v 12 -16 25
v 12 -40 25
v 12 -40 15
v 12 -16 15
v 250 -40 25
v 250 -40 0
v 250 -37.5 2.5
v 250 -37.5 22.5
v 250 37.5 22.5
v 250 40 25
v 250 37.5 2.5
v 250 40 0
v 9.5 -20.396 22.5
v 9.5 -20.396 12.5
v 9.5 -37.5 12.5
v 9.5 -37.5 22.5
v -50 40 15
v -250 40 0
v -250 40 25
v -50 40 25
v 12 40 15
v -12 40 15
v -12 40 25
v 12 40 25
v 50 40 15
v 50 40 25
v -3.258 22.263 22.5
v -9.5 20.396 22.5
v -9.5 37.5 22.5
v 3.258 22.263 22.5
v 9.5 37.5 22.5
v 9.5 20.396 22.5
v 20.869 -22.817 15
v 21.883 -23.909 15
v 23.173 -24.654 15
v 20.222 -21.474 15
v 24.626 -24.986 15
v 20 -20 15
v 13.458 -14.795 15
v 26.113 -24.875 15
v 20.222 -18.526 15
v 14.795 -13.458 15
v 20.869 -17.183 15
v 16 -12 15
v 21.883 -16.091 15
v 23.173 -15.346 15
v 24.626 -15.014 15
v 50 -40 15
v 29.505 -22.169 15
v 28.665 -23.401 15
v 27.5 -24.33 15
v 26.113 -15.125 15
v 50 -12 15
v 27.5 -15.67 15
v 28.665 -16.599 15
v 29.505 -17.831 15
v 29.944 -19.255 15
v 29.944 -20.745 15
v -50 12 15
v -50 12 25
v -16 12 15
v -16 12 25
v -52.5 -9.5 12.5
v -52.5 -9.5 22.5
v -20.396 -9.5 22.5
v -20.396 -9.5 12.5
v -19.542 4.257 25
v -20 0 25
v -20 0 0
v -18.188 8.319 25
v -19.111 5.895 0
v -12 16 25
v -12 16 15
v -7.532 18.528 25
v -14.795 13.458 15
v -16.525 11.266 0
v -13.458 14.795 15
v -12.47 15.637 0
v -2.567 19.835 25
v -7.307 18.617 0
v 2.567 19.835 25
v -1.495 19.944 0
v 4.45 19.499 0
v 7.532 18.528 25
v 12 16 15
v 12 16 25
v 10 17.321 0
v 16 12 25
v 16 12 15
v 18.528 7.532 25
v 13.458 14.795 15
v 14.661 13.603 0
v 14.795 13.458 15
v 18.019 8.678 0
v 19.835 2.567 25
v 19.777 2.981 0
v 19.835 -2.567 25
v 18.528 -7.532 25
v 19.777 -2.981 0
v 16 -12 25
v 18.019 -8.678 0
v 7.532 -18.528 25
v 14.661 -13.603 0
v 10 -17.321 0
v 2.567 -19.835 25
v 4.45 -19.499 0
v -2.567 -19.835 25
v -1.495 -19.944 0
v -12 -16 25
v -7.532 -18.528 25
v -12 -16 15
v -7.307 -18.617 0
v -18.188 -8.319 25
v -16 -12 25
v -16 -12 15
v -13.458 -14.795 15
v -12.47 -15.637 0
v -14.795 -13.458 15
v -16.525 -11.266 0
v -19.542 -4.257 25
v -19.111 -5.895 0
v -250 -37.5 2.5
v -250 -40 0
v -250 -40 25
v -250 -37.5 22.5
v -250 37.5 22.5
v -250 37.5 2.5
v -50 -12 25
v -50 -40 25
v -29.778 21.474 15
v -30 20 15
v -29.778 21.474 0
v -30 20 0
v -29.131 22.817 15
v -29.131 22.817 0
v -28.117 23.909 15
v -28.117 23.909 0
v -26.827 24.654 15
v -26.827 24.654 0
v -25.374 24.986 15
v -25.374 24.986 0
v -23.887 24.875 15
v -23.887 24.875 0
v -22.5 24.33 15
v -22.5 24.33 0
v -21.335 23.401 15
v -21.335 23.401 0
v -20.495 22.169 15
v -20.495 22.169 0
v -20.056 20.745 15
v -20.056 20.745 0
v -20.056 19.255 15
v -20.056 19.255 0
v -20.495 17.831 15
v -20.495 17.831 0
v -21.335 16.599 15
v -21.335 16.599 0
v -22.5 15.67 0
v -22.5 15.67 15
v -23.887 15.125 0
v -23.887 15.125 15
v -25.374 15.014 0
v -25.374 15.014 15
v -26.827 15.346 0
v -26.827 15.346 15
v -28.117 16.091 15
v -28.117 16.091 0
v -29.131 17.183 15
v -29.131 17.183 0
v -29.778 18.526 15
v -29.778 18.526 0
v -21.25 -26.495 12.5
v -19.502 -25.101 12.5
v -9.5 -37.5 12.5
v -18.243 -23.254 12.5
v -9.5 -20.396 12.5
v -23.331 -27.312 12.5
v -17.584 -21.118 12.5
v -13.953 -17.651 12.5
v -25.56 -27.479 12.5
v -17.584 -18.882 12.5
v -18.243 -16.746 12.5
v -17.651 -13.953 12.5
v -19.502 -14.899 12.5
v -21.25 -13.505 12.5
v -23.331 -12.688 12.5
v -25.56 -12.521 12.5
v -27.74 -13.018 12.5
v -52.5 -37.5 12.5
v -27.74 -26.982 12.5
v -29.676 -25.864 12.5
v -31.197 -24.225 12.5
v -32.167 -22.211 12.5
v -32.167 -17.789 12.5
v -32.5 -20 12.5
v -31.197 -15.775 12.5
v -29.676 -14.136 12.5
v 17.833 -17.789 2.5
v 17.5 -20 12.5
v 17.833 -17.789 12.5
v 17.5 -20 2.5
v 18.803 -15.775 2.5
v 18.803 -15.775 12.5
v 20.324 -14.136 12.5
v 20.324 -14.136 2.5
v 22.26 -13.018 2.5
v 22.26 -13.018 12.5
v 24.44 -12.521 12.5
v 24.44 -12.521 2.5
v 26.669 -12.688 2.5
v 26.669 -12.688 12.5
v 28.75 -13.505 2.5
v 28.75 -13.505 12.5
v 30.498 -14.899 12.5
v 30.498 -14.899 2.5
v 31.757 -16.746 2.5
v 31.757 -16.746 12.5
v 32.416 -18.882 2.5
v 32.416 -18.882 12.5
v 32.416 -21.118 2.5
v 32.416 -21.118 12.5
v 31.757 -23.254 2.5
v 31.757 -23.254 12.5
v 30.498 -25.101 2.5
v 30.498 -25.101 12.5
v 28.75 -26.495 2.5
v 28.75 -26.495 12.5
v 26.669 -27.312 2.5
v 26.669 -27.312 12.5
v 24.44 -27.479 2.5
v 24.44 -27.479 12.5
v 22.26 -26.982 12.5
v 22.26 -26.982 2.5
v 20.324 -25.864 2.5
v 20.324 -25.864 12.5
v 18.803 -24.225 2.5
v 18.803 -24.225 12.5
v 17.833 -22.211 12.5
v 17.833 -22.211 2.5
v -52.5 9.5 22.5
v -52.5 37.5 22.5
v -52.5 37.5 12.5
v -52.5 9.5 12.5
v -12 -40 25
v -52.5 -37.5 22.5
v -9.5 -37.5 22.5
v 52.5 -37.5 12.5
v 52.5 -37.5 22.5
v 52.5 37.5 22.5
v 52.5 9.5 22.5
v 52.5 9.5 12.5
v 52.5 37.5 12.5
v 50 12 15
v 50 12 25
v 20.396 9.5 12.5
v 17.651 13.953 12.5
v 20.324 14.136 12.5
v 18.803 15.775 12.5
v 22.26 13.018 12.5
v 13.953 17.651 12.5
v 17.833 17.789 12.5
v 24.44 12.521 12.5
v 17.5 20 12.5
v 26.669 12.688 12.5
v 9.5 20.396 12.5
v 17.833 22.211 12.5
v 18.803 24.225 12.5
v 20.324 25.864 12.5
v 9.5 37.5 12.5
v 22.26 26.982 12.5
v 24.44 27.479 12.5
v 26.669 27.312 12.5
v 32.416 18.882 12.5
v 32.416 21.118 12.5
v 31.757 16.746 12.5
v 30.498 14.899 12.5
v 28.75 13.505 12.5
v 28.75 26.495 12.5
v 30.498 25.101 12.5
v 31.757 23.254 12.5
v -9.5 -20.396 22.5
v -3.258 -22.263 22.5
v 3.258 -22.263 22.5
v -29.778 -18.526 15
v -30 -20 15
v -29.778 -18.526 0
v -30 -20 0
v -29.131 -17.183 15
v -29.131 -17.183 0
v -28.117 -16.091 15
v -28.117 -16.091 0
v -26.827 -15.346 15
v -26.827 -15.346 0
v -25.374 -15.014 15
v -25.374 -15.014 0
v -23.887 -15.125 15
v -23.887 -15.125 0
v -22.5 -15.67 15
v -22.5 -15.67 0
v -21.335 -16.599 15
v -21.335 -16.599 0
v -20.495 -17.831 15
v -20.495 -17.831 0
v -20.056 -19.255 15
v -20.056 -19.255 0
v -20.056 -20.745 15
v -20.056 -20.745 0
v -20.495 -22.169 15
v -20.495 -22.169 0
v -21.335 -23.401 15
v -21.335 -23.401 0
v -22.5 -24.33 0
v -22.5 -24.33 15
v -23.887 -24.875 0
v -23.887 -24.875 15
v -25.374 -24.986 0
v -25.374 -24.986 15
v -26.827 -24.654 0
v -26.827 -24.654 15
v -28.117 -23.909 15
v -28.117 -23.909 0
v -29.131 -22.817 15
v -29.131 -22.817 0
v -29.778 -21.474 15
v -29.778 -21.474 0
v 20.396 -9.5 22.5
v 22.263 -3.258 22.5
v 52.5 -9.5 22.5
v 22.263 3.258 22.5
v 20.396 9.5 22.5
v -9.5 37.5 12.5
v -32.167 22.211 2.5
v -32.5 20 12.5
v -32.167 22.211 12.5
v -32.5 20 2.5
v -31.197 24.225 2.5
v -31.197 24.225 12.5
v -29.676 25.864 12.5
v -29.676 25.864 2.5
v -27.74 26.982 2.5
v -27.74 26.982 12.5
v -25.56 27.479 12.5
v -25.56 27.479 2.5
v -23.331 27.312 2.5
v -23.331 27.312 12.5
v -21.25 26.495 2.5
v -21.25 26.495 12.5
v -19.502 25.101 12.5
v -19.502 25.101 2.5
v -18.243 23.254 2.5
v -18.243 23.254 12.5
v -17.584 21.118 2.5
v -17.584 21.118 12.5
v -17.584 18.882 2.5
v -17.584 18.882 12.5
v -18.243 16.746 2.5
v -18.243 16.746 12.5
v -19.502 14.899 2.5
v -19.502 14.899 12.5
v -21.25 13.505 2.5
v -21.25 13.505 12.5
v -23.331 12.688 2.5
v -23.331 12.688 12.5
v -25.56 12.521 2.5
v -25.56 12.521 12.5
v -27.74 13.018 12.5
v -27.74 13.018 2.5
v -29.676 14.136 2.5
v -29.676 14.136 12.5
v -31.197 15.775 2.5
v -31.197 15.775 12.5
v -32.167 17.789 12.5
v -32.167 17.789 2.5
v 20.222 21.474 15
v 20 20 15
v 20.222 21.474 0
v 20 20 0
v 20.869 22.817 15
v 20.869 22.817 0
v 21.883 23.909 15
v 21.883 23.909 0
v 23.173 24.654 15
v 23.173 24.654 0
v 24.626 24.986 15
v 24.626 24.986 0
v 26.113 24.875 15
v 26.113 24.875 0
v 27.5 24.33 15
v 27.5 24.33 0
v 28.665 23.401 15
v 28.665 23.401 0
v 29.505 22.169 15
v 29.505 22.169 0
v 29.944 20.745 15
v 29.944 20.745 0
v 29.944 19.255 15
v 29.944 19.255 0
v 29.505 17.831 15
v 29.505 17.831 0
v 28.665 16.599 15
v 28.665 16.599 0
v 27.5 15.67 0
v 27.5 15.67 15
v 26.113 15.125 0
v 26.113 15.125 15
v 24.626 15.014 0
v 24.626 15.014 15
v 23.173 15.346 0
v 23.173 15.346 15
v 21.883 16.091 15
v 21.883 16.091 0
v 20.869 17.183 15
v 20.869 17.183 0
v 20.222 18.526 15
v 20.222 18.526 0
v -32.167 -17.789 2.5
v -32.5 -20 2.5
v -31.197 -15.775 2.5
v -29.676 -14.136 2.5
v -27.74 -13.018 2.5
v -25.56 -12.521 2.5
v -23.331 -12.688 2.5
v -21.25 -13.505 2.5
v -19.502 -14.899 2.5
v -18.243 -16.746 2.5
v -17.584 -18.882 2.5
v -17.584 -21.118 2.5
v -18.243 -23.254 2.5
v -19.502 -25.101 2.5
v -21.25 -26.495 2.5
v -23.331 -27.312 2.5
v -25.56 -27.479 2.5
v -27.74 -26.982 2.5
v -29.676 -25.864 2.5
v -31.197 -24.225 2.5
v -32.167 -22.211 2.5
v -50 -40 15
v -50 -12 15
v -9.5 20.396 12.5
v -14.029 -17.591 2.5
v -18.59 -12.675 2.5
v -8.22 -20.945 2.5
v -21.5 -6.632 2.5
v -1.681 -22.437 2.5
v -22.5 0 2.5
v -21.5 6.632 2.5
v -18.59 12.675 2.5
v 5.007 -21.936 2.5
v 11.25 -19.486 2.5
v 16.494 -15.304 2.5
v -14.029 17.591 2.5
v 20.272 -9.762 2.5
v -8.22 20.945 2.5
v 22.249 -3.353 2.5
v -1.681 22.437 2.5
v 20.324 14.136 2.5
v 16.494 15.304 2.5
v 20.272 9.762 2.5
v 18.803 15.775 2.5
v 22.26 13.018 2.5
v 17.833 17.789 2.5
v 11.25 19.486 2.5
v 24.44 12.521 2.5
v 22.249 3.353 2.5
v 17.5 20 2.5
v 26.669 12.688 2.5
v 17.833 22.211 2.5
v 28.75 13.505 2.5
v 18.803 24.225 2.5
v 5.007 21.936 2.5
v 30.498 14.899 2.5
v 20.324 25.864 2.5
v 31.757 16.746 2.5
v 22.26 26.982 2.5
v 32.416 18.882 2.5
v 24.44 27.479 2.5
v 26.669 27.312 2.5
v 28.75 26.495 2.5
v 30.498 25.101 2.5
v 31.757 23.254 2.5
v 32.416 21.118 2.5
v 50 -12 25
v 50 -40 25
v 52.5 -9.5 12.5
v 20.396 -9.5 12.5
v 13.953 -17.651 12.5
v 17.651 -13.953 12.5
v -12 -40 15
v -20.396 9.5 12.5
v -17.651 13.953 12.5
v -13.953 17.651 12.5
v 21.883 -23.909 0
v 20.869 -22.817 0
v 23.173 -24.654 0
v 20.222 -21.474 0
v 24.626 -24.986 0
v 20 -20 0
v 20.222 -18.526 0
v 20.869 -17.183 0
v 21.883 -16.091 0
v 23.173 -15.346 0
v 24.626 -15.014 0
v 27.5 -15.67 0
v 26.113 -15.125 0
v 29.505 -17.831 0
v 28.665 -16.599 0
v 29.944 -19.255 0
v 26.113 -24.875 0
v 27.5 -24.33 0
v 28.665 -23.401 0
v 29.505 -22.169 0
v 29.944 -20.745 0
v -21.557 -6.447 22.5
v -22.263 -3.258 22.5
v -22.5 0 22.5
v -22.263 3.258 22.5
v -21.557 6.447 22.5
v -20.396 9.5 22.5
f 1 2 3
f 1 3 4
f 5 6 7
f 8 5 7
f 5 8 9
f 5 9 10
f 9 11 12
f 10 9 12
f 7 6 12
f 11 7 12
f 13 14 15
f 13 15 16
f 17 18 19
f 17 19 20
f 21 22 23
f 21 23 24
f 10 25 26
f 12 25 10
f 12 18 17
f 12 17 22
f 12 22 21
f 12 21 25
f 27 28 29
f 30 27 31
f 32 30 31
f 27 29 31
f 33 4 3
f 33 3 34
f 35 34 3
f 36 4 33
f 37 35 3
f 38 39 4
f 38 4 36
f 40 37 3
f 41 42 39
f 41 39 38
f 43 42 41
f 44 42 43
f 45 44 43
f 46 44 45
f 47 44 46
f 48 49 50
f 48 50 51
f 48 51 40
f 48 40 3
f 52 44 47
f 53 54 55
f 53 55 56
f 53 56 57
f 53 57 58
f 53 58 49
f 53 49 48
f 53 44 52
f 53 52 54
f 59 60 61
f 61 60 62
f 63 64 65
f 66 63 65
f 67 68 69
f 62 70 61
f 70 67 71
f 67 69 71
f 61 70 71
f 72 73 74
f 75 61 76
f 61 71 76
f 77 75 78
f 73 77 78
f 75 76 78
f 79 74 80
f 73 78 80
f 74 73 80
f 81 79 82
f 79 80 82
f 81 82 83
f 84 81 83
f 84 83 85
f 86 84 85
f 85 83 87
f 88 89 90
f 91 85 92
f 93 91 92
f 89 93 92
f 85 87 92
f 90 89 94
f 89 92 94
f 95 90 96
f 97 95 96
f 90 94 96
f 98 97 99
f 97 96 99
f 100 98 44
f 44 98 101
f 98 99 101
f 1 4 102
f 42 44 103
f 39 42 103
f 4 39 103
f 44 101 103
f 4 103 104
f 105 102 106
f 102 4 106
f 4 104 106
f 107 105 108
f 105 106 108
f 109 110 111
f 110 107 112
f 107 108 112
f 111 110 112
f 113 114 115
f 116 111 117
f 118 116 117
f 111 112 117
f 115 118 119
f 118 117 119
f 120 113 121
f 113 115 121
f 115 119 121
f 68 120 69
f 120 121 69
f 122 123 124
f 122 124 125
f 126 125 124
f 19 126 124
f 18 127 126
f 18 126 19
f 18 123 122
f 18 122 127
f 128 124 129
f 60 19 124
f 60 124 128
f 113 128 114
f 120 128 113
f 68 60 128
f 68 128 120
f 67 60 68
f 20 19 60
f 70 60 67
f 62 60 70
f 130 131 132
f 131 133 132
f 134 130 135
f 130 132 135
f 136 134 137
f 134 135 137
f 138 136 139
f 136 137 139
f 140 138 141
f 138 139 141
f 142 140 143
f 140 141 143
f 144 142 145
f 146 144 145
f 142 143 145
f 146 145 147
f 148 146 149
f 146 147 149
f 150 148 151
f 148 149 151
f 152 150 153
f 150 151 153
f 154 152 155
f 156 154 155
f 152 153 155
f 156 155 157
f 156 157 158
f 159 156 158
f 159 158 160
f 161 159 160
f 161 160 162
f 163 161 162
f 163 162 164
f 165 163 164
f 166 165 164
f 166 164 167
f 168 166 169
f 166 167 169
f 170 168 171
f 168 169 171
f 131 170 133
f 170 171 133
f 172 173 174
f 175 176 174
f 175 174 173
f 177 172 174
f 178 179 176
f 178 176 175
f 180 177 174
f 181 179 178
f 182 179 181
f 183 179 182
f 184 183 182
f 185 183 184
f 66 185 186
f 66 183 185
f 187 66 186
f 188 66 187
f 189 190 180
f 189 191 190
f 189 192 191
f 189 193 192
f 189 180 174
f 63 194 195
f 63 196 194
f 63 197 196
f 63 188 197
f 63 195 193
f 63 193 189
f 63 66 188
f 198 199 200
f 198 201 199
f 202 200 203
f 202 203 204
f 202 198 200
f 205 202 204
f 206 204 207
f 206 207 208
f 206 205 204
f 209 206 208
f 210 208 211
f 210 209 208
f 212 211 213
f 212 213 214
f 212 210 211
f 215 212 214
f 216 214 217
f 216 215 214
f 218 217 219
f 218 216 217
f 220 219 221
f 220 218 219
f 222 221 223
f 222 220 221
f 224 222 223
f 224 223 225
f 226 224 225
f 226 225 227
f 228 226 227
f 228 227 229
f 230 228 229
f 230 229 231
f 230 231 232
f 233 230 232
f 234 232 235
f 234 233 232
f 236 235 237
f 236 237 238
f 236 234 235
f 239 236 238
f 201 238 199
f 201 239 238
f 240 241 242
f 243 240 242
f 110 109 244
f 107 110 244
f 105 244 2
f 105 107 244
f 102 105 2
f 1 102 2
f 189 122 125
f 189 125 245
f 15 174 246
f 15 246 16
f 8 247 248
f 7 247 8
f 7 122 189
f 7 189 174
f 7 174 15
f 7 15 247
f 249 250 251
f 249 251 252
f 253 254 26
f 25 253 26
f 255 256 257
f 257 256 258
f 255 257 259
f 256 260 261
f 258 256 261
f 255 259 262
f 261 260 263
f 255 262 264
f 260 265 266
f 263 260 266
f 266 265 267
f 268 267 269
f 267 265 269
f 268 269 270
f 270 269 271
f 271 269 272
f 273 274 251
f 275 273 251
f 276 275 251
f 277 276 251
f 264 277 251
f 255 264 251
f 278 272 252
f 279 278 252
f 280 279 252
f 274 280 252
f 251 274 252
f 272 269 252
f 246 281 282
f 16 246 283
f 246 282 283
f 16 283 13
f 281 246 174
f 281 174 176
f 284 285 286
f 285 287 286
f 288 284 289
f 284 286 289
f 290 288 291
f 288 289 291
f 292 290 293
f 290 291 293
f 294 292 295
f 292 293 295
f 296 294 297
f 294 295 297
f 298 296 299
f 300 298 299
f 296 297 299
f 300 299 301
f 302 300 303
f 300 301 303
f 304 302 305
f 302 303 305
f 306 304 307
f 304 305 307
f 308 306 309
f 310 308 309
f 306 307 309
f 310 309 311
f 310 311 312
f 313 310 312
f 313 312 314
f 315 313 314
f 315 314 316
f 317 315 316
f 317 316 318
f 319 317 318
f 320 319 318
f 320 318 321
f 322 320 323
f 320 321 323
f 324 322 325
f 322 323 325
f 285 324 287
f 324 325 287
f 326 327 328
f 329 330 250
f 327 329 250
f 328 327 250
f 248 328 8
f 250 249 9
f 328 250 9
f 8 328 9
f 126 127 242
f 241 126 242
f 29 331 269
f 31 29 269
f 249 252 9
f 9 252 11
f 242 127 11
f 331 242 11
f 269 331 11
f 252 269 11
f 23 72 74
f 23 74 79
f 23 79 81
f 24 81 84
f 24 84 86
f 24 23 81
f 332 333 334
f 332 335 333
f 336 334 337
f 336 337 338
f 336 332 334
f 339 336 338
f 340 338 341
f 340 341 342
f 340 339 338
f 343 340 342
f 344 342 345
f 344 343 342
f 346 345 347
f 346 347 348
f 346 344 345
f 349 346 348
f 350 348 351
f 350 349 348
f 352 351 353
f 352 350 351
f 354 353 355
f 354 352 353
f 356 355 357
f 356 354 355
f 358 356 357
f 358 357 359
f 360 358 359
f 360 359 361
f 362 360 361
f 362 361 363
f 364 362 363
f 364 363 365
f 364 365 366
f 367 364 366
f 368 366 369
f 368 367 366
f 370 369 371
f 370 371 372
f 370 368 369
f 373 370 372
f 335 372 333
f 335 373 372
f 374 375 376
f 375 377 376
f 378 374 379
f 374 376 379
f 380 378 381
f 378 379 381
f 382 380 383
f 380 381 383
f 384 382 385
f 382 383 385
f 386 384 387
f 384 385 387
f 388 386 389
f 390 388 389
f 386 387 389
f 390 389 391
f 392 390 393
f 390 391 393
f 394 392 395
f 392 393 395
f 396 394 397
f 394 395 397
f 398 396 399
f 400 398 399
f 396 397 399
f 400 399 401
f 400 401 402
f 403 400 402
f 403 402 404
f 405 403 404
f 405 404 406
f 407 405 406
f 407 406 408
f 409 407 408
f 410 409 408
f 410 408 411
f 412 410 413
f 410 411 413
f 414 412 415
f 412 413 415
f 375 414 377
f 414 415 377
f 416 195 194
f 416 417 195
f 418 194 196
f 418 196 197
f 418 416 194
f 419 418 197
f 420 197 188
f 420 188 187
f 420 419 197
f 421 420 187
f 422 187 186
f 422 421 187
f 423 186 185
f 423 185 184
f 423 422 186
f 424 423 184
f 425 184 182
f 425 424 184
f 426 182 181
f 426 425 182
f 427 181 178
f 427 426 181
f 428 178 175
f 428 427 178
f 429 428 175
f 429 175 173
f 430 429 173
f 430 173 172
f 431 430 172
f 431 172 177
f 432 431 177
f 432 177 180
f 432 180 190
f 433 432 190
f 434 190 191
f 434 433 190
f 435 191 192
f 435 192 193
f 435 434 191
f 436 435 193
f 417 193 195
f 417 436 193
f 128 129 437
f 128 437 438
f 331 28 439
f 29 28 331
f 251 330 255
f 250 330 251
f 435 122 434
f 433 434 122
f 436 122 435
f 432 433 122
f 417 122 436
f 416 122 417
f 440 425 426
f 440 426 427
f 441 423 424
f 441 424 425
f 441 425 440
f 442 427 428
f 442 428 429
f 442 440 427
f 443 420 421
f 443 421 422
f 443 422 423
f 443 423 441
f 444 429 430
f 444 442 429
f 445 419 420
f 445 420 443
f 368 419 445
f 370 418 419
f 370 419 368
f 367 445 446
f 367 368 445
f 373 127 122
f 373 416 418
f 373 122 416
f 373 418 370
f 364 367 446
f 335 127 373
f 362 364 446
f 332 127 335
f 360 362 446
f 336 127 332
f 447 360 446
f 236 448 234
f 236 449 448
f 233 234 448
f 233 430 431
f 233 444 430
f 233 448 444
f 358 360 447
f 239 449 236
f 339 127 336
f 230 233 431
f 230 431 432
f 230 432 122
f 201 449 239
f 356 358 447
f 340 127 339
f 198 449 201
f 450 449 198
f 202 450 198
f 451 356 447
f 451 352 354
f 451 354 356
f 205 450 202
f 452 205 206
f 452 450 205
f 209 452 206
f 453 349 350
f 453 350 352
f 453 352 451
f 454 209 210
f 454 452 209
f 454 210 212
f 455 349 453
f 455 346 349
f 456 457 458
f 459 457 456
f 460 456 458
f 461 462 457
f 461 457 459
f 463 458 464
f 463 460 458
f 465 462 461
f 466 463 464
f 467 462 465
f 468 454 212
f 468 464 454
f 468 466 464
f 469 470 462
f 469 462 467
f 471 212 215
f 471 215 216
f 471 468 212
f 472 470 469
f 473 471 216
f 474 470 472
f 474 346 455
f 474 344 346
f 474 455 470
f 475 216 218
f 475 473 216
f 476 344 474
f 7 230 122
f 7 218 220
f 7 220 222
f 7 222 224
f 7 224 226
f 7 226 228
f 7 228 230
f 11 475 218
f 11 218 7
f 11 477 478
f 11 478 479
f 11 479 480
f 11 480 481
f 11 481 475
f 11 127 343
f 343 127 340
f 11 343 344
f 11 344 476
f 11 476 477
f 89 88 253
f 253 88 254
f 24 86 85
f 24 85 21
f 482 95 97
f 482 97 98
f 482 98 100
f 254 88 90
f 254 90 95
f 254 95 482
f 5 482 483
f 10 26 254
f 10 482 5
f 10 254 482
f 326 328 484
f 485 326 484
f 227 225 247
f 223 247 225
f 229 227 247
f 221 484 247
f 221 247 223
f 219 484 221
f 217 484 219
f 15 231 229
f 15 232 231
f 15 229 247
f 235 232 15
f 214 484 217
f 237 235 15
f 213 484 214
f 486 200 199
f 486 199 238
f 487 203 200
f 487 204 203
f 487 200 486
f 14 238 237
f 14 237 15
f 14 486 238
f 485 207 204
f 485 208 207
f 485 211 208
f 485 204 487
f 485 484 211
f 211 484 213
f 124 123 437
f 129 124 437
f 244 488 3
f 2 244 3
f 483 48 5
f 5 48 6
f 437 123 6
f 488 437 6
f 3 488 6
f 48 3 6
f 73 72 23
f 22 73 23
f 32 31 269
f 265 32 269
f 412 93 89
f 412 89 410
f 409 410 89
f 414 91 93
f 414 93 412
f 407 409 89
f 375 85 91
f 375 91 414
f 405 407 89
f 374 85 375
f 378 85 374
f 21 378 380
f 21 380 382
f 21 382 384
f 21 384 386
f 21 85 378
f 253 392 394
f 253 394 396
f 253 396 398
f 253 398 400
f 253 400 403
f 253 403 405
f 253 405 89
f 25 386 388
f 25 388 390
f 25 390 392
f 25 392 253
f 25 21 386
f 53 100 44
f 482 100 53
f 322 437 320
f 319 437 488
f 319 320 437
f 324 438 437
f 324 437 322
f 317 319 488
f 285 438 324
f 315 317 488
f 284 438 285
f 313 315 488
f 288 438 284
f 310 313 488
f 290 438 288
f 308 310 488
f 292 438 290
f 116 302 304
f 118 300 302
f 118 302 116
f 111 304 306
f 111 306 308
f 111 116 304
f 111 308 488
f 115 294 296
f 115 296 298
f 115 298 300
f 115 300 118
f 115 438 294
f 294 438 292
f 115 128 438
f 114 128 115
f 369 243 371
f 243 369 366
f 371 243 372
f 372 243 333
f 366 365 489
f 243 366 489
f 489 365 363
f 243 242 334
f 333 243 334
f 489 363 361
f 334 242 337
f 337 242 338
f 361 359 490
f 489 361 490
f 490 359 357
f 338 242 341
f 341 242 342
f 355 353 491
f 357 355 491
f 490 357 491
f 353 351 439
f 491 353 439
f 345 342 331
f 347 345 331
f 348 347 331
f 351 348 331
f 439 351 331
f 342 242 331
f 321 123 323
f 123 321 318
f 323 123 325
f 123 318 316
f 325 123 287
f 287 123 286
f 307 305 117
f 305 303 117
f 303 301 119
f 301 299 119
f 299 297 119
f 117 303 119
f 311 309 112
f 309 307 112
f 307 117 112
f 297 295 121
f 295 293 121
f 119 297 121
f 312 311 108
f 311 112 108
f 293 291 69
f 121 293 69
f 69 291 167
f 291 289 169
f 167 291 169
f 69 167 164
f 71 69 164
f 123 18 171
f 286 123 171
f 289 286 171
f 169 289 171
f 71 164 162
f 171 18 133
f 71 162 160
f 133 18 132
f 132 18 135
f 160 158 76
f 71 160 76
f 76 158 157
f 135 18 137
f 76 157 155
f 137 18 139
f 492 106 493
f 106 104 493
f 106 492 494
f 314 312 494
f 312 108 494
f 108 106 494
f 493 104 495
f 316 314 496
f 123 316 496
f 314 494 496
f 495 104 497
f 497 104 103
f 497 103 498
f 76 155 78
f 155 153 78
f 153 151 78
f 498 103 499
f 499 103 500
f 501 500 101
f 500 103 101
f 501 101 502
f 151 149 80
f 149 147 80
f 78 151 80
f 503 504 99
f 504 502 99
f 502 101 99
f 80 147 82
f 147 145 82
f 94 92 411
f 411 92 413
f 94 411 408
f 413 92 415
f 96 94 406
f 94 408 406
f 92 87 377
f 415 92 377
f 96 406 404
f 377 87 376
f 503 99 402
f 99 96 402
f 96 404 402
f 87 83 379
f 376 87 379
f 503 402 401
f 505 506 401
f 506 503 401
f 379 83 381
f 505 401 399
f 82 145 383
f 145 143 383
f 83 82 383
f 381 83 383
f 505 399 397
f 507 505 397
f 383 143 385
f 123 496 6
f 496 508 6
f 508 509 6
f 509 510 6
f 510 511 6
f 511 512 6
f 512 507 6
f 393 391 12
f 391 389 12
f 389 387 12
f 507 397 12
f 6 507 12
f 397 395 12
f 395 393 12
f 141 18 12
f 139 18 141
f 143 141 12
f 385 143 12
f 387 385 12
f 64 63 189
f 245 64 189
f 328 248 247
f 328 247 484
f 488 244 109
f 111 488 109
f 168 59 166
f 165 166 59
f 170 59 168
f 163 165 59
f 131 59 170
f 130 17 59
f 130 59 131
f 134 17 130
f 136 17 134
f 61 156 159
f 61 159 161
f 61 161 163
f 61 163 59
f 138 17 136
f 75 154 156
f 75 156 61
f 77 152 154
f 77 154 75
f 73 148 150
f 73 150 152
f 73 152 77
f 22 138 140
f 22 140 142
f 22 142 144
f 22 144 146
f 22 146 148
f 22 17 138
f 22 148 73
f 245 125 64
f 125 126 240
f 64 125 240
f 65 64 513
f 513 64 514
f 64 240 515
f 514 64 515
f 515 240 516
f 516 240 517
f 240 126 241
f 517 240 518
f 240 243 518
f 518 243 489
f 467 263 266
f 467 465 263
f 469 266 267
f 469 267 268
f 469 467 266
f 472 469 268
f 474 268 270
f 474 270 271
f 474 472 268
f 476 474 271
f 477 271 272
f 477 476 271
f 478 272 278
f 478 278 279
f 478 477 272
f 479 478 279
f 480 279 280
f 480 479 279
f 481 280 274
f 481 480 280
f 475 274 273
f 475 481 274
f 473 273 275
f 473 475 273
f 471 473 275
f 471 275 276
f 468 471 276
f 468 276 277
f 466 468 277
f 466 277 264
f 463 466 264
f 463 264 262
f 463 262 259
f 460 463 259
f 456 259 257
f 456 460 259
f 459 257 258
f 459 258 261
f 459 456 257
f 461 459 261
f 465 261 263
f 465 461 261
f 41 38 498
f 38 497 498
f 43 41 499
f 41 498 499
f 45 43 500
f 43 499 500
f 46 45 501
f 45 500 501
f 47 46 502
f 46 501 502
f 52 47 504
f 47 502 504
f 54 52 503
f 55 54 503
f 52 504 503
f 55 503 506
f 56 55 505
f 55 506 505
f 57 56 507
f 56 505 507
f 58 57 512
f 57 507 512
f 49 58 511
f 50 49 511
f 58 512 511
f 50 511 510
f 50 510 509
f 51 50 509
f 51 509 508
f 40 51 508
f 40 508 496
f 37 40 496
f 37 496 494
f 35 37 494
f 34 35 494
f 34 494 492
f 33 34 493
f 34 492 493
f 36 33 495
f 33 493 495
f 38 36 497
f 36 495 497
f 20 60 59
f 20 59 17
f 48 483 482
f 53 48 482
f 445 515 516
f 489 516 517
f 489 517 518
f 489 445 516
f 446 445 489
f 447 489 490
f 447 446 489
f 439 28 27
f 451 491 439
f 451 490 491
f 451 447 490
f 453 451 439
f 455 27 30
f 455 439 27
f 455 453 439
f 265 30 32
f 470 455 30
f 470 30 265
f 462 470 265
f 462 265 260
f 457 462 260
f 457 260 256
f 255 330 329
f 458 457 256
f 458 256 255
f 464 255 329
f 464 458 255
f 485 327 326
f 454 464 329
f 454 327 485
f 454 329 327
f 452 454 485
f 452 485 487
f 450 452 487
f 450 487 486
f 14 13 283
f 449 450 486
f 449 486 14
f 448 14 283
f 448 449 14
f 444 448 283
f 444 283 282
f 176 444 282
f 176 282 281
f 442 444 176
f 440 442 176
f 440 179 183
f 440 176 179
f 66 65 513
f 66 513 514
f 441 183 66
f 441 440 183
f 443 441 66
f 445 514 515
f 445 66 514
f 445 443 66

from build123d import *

# Parameters (mm, degrees)
F0_W         = 500
F0_H         = 80
F1_DEPTH     = 25
F3_D         = 40
F3_DEPTH     = 25
F3_TIP       = 12.0172123806
F4_D         = 10
F4_DEPTH     = 25
F4_TIP       = 3.0043030951
F2_W         = 38
F2_H         = 28
F5_DEPTH     = 10
F6_T         = 2.5
F6_T3_DEPTH  = 15
F6_T5_DEPTH  = 33
F6_T7_DEPTH  = 29
F6_T9_DEPTH  = 39
F6_T11_DEPTH = 39
F6_T13_DEPTH = 33
F6_T15_DEPTH = 29


# Not quite as in the source:
# - a shell that OpenCascade refuses in one call is made with other operations: the cavity is built on its own and cut out


with BuildPart() as f1:
    # F0 (on Top) → F1 (new body)
    with BuildSketch(Plane.XY):
        Rectangle(F0_W, F0_H)
    extrude(amount=F1_DEPTH)

    # F3
    with Locations(Plane.XY.offset(25)):
        with Locations((0, 0)):
            Hole(F3_D / 2, depth=F3_DEPTH)
            with Locations((0, 0, -(F3_DEPTH + F3_TIP / 2))):  # 118° drill point
                Cone(0, F3_D / 2, F3_TIP, mode=Mode.SUBTRACT)

    # F4
    with Locations(Plane.XY.offset(25)):
        with Locations((-25, 20), (25, 20), (25, -20), (-25, -20)):
            Hole(F4_D / 2, depth=F4_DEPTH)
            with Locations((0, 0, -(F4_DEPTH + F4_TIP / 2))):  # 118° drill point
                Cone(0, F4_D / 2, F4_TIP, mode=Mode.SUBTRACT)

    # F2 (on face) → F5 (cut)
    with BuildSketch(Plane.XY.offset(25)):
        with Locations((-31, -26)):
            Rectangle(F2_W, F2_H)
        with Locations((-31, 26)):
            Rectangle(F2_W, F2_H)
        with Locations((31, 26)):
            Rectangle(F2_W, F2_H)
        with Locations((31, -26)):
            Rectangle(F2_W, F2_H)
    extrude(amount=-F5_DEPTH, mode=Mode.SUBTRACT)

    # F6: shell of thickness 2.5, made by hand


with BuildPart() as f6_core1:
    # F6_t2: copy of F1
    add(f1.part)

    # the walls: a layer under each face that stays
    f6_faces = [f6_core1.faces().sort_by_distance(p)[0] for p in [
        (0, 40, 12.5),
        (-166.6666666667, -26.6666666667, 0),
        (-133, 0, 25),
        (-50, 26, 20),
        (-31, 26, 15),
        (-12, 28, 20),
        (0, 28, 25),
        (12, 28, 20),
        (31, 26, 15),
        (50, 26, 20),
        (133, 0, 25),
        (0, -40, 12.5),
        (-30, -20, 7.5),
        (20, -20, 7.5),
        (-30, 20, 7.5),
        (-20, 0, 12.5),
        (20, 20, 7.5),
        (-33, 12, 20),
        (-33, -12, 20),
        (-50, -26, 20),
        (33, 12, 20),
        (50, -26, 20),
        (33, -12, 20),
        (31, -26, 15),
        (12, -28, 20),
        (0, -28, 25),
        (-12, -28, 20),
        (-31, -26, 15),
    ]]
    thicken(f6_faces, amount=-F6_T, mode=Mode.SUBTRACT)

    # F6_s4 → F6_t3 (cut)
    with BuildSketch(Plane.XY.offset(12.5)):
        Polygon((-49.975, 12.025), (-52.5, 12), (-52.5, 9.5), (-50, 9.5), align=None)
        Polygon((49.975, 12.025), (52.5, 12), (52.5, 9.5), (50, 9.5), align=None)
        Polygon((-49.975, -12.025), (-50, -9.5), (-52.5, -9.5), (-52.5, -12), align=None)
        Polygon((49.975, -12.025), (52.5, -12), (52.5, -9.5), (50, -9.5), align=None)
    extrude(amount=F6_T3_DEPTH, mode=Mode.SUBTRACT)

    # F6_s6 → F6_t5 (cut)
    with BuildSketch(Plane.XZ.offset(-42.5)):
        Polygon((-49.975, 15.025), (-52.5, 15), (-52.5, 12.5), (-50, 12.5), align=None)
        Polygon((49.975, 15.025), (50, 12.5), (52.5, 12.5), (52.5, 15), align=None)
    extrude(amount=F6_T5_DEPTH, mode=Mode.SUBTRACT)

    # F6_s8 → F6_t7 (cut)
    with BuildSketch(Plane.XZ.offset(-42.5)):
        Polygon((-12.025, 15.025), (-12, 12.5), (-9.5, 12.5), (-9.5, 15), align=None)
        Polygon((12.025, 15.025), (9.5, 15), (9.5, 12.5), (12, 12.5), align=None)
    extrude(amount=F6_T7_DEPTH, mode=Mode.SUBTRACT)

    # F6_s10 → F6_t9 (cut)
    with BuildSketch(Plane.YZ.offset(-52.5)):
        Polygon((12.025, 15.025), (12, 12.5), (9.5, 12.5), (9.5, 15), align=None)
        Polygon((-12.025, 15.025), (-9.5, 15), (-9.5, 12.5), (-12, 12.5), align=None)
    extrude(amount=F6_T9_DEPTH, mode=Mode.SUBTRACT)

    # F6_s12 → F6_t11 (cut)
    with BuildSketch(Plane.YZ.offset(13.5)):
        Polygon((12.025, 15.025), (12, 12.5), (9.5, 12.5), (9.5, 15), align=None)
        Polygon((-12.025, 15.025), (-9.5, 15), (-9.5, 12.5), (-12, 12.5), align=None)
    extrude(amount=F6_T11_DEPTH, mode=Mode.SUBTRACT)

    # F6_s14 → F6_t13 (cut)
    with BuildSketch(Plane.XZ.offset(9.5)):
        Polygon((-49.975, 15.025), (-52.5, 15), (-52.5, 12.5), (-50, 12.5), align=None)
        Polygon((49.975, 15.025), (52.5, 15), (52.5, 12.5), (50, 12.5), align=None)
    extrude(amount=F6_T13_DEPTH, mode=Mode.SUBTRACT)

    # F6_s16 → F6_t15 (cut)
    with BuildSketch(Plane.XZ.offset(13.5)):
        Polygon((12.025, 15.025), (12, 12.5), (9.5, 12.5), (9.5, 15), align=None)
        Polygon((-12.025, 15.025), (-9.5, 15), (-9.5, 12.5), (-12, 12.5), align=None)
    extrude(amount=F6_T15_DEPTH, mode=Mode.SUBTRACT)


with BuildPart() as f1_1:
    add(f1.part)

    # what is left inside the walls is the cavity
    f6_cavity = [f6_core1.part.solids().sort_by_distance(p)[0] for p in [
        (-125, 12.5, 2.525),
    ]]
    add(f6_cavity, mode=Mode.SUBTRACT)


solid = f1_1.part
